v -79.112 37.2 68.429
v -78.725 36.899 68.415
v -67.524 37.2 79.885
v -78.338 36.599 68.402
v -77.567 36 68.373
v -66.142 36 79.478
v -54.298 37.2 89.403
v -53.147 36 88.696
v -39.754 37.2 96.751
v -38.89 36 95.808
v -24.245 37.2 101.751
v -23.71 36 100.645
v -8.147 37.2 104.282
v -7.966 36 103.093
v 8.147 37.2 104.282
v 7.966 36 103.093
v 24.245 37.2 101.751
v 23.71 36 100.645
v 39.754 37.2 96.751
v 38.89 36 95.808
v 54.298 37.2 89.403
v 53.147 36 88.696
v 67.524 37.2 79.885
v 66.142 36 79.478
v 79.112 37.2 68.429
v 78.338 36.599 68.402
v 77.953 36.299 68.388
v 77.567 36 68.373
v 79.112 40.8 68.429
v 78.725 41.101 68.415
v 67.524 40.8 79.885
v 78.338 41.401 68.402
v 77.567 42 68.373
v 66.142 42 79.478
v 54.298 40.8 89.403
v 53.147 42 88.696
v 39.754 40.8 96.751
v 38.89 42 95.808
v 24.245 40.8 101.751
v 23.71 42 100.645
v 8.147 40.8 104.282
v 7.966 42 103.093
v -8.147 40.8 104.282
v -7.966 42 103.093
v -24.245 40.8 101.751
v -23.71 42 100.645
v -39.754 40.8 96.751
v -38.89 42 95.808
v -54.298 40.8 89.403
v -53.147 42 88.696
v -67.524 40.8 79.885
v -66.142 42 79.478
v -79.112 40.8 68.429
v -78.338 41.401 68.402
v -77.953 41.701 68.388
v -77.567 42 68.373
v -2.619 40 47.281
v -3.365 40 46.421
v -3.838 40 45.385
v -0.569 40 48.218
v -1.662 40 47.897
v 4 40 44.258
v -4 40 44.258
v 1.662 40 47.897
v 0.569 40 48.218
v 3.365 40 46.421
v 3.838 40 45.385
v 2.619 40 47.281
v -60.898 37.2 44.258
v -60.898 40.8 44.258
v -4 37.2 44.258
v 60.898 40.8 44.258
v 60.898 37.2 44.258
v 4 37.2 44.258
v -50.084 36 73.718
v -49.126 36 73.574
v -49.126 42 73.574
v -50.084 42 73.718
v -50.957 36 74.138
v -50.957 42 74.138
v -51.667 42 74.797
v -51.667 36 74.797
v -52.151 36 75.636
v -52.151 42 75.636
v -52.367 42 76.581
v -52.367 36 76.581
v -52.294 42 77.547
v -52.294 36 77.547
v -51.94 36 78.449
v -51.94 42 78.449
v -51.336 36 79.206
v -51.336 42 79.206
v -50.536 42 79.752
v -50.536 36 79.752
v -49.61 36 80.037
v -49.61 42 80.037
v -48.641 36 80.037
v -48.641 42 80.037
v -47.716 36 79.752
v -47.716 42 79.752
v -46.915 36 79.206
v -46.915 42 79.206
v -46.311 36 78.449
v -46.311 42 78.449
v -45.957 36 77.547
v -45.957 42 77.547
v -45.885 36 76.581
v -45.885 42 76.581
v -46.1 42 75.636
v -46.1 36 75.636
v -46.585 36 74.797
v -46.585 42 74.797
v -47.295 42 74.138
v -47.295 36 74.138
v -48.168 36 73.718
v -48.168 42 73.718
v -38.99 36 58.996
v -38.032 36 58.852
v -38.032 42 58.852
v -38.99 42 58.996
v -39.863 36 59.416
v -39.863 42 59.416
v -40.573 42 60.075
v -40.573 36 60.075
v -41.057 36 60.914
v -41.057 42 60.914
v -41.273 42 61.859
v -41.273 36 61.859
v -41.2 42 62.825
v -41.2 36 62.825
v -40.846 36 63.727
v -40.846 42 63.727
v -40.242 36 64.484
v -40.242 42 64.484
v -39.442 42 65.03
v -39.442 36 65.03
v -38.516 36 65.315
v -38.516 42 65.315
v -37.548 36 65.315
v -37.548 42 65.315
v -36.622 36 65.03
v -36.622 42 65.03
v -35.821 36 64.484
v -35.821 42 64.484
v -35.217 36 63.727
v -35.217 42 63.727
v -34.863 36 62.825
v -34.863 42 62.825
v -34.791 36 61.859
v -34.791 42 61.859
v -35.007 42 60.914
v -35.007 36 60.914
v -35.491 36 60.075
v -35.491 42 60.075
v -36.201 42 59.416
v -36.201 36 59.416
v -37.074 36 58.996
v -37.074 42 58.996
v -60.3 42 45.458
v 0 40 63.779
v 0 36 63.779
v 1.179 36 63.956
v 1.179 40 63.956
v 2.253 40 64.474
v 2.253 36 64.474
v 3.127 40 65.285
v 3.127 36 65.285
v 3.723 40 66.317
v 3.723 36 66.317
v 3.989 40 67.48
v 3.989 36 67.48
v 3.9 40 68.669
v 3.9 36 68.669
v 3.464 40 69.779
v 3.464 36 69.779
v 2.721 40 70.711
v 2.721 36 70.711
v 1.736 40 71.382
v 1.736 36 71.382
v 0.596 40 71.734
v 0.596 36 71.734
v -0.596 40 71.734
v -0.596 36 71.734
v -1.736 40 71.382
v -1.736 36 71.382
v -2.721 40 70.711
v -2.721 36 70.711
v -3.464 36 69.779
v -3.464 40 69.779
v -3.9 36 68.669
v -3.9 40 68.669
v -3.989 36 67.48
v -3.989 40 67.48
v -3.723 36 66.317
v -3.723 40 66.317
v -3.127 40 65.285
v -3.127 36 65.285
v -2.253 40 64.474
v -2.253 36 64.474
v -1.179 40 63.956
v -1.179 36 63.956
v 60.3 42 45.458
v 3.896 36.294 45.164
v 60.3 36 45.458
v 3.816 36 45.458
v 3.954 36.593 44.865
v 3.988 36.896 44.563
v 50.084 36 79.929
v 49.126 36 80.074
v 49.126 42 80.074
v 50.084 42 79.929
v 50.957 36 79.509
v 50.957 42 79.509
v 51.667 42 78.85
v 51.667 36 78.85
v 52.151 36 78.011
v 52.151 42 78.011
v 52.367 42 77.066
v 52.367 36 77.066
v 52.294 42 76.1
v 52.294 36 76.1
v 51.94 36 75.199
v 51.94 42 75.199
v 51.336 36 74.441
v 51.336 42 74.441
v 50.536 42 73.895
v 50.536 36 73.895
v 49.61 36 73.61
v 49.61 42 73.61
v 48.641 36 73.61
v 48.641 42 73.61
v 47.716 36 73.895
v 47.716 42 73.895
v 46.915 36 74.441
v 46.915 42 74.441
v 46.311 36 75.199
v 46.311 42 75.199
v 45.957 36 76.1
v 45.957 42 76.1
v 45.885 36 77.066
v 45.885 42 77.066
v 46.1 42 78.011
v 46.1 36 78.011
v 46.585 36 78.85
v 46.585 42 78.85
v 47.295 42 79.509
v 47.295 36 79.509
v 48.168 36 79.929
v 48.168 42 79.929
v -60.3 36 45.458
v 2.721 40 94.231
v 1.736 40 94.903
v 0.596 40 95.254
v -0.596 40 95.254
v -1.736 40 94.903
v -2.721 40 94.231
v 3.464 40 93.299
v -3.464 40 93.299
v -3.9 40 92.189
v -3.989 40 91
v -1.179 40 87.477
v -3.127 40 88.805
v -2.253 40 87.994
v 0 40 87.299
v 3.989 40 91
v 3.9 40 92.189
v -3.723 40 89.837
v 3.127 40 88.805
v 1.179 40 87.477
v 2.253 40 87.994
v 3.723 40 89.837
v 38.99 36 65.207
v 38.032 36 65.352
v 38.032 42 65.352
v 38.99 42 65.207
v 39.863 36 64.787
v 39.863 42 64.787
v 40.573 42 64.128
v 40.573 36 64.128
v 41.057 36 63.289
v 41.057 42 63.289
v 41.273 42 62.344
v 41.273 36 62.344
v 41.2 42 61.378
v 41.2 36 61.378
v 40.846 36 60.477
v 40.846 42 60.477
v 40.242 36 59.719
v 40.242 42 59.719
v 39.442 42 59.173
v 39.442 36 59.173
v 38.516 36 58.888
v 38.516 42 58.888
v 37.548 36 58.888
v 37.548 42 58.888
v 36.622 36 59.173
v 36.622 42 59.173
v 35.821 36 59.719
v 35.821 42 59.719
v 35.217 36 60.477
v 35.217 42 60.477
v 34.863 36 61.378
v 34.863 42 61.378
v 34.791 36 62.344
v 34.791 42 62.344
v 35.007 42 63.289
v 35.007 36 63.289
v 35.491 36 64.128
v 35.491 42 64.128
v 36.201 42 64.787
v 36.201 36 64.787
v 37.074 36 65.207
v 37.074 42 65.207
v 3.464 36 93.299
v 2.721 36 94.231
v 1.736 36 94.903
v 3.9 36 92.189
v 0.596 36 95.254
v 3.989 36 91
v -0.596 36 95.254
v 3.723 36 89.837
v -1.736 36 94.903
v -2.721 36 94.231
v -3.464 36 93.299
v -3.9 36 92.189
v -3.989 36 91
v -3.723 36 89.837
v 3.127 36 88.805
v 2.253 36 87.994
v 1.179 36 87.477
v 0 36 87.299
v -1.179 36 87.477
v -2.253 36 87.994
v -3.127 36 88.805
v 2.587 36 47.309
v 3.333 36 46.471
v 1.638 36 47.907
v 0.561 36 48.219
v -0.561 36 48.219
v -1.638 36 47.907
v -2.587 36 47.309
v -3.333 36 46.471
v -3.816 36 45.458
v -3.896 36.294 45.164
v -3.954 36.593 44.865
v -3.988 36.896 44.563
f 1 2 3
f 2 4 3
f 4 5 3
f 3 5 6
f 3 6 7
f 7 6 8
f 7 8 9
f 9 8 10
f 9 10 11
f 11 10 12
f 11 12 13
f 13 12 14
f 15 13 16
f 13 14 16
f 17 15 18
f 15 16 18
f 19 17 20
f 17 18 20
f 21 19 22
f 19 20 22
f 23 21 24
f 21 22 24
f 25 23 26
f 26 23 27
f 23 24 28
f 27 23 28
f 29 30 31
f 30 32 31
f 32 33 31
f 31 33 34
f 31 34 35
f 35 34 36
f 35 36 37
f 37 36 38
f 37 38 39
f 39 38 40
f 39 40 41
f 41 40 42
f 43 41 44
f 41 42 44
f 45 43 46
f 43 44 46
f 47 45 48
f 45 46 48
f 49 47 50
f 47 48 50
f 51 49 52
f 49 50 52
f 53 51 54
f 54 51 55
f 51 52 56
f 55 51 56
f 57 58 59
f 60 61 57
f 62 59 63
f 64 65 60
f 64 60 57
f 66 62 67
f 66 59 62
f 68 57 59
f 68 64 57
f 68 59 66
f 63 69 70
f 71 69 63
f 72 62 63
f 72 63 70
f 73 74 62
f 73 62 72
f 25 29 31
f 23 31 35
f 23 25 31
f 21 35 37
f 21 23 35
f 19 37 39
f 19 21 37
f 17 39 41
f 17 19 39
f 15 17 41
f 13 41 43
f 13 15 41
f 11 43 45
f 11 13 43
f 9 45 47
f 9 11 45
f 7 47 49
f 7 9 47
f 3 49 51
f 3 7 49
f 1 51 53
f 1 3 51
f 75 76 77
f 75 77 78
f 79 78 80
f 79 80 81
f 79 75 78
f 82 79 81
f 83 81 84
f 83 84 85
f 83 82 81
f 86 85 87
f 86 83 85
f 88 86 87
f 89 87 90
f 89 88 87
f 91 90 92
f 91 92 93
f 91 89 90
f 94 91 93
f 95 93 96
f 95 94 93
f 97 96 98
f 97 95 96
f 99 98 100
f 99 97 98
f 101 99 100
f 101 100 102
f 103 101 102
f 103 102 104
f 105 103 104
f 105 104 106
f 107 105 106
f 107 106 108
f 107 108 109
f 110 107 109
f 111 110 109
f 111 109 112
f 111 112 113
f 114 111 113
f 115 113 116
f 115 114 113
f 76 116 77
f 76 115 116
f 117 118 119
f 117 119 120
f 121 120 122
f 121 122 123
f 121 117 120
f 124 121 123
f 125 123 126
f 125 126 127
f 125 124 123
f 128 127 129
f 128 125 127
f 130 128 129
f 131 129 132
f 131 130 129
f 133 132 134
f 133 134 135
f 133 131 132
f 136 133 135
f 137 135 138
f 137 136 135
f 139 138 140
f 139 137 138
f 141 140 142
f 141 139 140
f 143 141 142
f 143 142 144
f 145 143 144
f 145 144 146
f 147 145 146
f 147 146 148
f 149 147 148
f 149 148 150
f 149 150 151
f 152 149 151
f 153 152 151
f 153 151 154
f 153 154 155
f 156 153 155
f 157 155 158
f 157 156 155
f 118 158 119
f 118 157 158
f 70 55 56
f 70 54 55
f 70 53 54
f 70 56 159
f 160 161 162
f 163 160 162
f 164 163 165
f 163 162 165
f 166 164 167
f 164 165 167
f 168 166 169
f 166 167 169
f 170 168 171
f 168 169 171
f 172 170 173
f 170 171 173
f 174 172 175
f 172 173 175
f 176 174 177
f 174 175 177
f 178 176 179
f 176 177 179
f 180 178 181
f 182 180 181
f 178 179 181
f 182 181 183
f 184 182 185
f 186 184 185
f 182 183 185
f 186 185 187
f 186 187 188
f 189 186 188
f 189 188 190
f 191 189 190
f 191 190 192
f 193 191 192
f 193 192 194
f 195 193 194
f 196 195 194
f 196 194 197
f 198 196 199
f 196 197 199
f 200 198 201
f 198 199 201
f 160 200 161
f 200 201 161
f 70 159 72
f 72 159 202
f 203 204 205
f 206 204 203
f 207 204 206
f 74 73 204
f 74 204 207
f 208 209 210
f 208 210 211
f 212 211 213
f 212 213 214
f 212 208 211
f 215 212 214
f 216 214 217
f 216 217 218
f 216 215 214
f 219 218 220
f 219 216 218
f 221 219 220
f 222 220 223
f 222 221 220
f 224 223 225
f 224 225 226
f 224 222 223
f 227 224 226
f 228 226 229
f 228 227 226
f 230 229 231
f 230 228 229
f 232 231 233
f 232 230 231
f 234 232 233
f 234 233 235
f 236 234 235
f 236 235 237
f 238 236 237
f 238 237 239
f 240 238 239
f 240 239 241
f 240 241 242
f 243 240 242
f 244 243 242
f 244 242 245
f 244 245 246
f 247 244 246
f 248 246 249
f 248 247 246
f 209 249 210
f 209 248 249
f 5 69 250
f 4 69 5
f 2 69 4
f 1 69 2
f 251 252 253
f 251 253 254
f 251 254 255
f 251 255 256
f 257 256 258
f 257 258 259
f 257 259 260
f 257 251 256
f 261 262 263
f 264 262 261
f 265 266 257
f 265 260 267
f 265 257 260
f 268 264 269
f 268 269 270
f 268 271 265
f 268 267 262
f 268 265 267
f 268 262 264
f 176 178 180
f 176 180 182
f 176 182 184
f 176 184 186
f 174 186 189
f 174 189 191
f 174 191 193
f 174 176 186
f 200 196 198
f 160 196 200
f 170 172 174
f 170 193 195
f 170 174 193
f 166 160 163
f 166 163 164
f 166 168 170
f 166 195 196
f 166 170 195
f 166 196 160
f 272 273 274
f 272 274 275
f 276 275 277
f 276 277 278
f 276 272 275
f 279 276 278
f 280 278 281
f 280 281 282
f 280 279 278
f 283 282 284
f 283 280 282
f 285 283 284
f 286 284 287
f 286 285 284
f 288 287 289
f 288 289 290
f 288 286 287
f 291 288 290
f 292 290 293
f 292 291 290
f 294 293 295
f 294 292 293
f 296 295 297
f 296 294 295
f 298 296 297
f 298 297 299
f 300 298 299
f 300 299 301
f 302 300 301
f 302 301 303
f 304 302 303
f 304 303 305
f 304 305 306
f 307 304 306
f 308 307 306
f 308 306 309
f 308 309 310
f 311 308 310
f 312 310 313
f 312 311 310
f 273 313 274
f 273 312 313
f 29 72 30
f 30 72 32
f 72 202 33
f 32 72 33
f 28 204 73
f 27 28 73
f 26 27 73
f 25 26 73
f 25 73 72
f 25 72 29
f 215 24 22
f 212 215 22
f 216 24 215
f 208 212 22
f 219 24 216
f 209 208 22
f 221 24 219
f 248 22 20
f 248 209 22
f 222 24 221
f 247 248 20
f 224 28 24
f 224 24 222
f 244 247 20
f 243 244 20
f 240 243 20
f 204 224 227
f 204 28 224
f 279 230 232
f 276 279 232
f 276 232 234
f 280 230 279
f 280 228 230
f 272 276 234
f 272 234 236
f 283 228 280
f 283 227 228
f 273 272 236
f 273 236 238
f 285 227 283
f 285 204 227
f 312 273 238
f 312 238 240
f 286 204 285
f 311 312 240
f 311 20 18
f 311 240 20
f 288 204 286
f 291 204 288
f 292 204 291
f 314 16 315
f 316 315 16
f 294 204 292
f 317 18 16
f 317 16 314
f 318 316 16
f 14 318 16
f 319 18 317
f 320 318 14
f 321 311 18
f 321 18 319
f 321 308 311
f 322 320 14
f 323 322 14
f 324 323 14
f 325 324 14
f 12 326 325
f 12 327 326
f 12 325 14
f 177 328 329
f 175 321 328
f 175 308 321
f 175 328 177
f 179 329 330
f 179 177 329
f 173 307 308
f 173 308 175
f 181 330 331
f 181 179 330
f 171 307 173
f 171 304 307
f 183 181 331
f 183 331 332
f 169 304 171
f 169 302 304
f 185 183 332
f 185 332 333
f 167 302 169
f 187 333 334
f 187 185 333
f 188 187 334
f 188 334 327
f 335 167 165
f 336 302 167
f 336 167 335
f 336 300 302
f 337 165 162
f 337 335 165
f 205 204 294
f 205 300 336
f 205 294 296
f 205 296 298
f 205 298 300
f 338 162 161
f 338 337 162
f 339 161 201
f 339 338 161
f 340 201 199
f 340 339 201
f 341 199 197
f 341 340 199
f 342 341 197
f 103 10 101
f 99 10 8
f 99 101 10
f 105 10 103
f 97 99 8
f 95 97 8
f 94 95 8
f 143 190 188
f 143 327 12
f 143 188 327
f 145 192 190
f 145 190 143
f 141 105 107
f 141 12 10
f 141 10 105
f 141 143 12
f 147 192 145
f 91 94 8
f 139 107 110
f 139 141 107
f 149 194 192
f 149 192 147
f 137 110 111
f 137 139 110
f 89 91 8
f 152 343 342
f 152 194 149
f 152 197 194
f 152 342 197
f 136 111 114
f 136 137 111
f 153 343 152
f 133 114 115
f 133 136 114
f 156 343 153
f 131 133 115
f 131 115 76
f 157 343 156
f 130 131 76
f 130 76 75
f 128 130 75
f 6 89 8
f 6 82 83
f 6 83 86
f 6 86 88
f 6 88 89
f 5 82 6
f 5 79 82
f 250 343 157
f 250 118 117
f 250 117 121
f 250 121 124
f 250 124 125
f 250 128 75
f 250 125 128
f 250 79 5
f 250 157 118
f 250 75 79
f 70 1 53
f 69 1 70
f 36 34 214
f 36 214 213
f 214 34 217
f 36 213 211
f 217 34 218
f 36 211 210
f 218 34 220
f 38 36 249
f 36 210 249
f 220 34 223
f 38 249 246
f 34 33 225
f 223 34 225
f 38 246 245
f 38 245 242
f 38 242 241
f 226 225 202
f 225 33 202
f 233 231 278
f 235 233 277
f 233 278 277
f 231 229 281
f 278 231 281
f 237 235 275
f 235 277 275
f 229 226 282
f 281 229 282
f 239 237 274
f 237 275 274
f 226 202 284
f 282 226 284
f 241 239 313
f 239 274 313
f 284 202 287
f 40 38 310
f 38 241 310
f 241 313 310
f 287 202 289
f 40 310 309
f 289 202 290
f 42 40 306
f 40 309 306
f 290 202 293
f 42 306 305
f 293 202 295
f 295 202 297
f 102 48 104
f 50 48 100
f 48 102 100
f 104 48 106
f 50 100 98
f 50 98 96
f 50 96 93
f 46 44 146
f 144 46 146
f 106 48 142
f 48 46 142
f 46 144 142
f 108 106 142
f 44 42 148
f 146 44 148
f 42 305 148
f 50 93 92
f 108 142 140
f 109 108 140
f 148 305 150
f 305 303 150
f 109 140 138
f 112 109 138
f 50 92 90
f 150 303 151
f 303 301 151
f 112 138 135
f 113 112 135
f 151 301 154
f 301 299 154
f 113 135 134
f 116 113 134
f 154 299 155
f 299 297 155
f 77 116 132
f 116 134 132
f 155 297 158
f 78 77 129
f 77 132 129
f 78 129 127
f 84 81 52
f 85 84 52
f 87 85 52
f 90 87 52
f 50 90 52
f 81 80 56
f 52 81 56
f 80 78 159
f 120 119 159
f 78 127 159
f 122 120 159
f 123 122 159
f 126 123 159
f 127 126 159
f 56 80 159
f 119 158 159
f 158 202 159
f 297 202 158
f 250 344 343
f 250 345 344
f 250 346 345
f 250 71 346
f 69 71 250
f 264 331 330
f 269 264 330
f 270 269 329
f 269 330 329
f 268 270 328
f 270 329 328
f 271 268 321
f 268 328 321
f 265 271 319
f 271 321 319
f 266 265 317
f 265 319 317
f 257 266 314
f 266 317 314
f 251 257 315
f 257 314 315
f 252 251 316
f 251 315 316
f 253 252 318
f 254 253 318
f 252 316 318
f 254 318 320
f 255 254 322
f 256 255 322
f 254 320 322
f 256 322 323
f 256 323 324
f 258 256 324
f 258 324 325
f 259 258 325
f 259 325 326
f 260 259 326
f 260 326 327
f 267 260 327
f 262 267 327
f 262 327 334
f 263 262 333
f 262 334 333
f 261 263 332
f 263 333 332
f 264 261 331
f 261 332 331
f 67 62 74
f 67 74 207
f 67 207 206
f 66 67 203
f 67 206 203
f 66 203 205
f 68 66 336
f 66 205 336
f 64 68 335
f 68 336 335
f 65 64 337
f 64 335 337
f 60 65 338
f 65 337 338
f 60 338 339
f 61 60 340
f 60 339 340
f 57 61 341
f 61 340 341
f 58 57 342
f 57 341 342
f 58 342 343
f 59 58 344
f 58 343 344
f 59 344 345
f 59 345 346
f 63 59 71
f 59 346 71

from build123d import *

# Parameters (mm, degrees)
SKETCH1_R           = 3.25
BOSS_EXTRUDE1_DEPTH = 6
SKETCH2_R           = 4
CUT_EXTRUDE1_DEPTH  = 4
CHAMFER1_START      = -18.742104721
CHAMFER1_2_DEPTH    = 45.742104721
CHAMFER1_START_2    = -27
CHAMFER1_3_DEPTH    = 45.742104721
CHAMFER2_SIZE       = 1.2


with BuildPart() as part:
    # Sketch1 → Boss-Extrude1 (new body)
    with BuildSketch(Plane(origin=(0, 36, 0), x_dir=(1, 0, 0), z_dir=(0, 1, 0))):
        with BuildLine():
            Line((-60.898028106, -44.25832974), (60.898028106, -44.25832974))
            Line((60.898028106, -44.25832974), (79.111739679, -68.428741366))
            ThreePointArc((79.111739679, -68.428741366), (0, -104.6), (-79.111739679, -68.428741366))
            Line((-79.111739679, -68.428741366), (-60.898028106, -44.25832974))
        make_face()
        with Locations(Location((38.031910385, -62.101530721, 0), (0, 0, 270))):
            Circle(SKETCH1_R, mode=Mode.SUBTRACT)
        with Locations(Location((49.125752403, -76.823556322, 0), (0, 0, 270))):
            Circle(SKETCH1_R, mode=Mode.SUBTRACT)
        with Locations(Location((-49.125752403, -76.823556322, 0), (0, 0, 90))):
            Circle(SKETCH1_R, mode=Mode.SUBTRACT)
        with Locations(Location((-38.031910385, -62.101530721, 0), (0, 0, 90))):
            Circle(SKETCH1_R, mode=Mode.SUBTRACT)
    extrude(amount=BOSS_EXTRUDE1_DEPTH)

    # Sketch2 → Cut-Extrude1 (cut)
    with BuildSketch(Plane.XZ.offset(-36)):
        with Locations(Location((0, 91.29880712, 0), (0, 0, 270))):
            Circle(SKETCH2_R)
        with Locations(Location((0, 67.77856843, 0), (0, 0, 270))):
            Circle(SKETCH2_R)
        with Locations((0, 44.25832974)):
            Circle(SKETCH2_R)
    extrude(amount=-CUT_EXTRUDE1_DEPTH, mode=Mode.SUBTRACT)

    # Chamfer1: read off the stored shape, not the designer's step
    # Chamfer1 outline → Chamfer1 (revolve, cut)
    with BuildSketch(Plane.XY):
        Polygon((104.6, 37.2), (103.4, 36), (104.6, 36), align=None)
    revolve(axis=Axis((0, 0, 0), (0, 1, 0)), mode=Mode.SUBTRACT)

    # Chamfer1 2 outline → Chamfer1 2 (cut)
    with BuildSketch(Plane(origin=(0, 0, 0), x_dir=(0.9431059319759283, 0.23510763606464977, -0.23510763606464977), z_dir=(0.3324924075401055, -0.6668765998774377, 0.6668765998774377)).offset(CHAMFER1_START)):
        Polygon((46, 57.599737343), (-59.092758772, 57.599737343), (-81.95286654, 74.690799308), (-83, 75.473675007), (-83, 56), (46, 56), align=None)
    extrude(amount=CHAMFER1_2_DEPTH, mode=Mode.SUBTRACT)

    # Chamfer1 3 outline → Chamfer1 3 (cut)
    with BuildSketch(Plane(origin=(0, 0, 0), x_dir=(0.9431059319759302, -0.23510763606464624, 0.23510763606464624), z_dir=(0.33249240754010045, 0.6668765998774391, -0.6668765998774391)).offset(CHAMFER1_START_2)):
        Polygon((-45, -57.599737343), (59.092758772, -57.599737343), (81.95286654, -74.690799308), (83, -75.473675007), (83, -56), (-45, -56), align=None)
    extrude(amount=CHAMFER1_3_DEPTH, mode=Mode.SUBTRACT)

    # Chamfer2
    chamfer2_edges = [part.edges().sort_by_distance(p)[0] for p in [
        (70.004883892, 42, 56.343535553),
        (0, 42, 44.25832974),
        (-70.004883892, 42, 56.343535553),
        (0, 42, 104.6),
    ]]
    chamfer(chamfer2_edges, length=CHAMFER2_SIZE)


solid = part.part
